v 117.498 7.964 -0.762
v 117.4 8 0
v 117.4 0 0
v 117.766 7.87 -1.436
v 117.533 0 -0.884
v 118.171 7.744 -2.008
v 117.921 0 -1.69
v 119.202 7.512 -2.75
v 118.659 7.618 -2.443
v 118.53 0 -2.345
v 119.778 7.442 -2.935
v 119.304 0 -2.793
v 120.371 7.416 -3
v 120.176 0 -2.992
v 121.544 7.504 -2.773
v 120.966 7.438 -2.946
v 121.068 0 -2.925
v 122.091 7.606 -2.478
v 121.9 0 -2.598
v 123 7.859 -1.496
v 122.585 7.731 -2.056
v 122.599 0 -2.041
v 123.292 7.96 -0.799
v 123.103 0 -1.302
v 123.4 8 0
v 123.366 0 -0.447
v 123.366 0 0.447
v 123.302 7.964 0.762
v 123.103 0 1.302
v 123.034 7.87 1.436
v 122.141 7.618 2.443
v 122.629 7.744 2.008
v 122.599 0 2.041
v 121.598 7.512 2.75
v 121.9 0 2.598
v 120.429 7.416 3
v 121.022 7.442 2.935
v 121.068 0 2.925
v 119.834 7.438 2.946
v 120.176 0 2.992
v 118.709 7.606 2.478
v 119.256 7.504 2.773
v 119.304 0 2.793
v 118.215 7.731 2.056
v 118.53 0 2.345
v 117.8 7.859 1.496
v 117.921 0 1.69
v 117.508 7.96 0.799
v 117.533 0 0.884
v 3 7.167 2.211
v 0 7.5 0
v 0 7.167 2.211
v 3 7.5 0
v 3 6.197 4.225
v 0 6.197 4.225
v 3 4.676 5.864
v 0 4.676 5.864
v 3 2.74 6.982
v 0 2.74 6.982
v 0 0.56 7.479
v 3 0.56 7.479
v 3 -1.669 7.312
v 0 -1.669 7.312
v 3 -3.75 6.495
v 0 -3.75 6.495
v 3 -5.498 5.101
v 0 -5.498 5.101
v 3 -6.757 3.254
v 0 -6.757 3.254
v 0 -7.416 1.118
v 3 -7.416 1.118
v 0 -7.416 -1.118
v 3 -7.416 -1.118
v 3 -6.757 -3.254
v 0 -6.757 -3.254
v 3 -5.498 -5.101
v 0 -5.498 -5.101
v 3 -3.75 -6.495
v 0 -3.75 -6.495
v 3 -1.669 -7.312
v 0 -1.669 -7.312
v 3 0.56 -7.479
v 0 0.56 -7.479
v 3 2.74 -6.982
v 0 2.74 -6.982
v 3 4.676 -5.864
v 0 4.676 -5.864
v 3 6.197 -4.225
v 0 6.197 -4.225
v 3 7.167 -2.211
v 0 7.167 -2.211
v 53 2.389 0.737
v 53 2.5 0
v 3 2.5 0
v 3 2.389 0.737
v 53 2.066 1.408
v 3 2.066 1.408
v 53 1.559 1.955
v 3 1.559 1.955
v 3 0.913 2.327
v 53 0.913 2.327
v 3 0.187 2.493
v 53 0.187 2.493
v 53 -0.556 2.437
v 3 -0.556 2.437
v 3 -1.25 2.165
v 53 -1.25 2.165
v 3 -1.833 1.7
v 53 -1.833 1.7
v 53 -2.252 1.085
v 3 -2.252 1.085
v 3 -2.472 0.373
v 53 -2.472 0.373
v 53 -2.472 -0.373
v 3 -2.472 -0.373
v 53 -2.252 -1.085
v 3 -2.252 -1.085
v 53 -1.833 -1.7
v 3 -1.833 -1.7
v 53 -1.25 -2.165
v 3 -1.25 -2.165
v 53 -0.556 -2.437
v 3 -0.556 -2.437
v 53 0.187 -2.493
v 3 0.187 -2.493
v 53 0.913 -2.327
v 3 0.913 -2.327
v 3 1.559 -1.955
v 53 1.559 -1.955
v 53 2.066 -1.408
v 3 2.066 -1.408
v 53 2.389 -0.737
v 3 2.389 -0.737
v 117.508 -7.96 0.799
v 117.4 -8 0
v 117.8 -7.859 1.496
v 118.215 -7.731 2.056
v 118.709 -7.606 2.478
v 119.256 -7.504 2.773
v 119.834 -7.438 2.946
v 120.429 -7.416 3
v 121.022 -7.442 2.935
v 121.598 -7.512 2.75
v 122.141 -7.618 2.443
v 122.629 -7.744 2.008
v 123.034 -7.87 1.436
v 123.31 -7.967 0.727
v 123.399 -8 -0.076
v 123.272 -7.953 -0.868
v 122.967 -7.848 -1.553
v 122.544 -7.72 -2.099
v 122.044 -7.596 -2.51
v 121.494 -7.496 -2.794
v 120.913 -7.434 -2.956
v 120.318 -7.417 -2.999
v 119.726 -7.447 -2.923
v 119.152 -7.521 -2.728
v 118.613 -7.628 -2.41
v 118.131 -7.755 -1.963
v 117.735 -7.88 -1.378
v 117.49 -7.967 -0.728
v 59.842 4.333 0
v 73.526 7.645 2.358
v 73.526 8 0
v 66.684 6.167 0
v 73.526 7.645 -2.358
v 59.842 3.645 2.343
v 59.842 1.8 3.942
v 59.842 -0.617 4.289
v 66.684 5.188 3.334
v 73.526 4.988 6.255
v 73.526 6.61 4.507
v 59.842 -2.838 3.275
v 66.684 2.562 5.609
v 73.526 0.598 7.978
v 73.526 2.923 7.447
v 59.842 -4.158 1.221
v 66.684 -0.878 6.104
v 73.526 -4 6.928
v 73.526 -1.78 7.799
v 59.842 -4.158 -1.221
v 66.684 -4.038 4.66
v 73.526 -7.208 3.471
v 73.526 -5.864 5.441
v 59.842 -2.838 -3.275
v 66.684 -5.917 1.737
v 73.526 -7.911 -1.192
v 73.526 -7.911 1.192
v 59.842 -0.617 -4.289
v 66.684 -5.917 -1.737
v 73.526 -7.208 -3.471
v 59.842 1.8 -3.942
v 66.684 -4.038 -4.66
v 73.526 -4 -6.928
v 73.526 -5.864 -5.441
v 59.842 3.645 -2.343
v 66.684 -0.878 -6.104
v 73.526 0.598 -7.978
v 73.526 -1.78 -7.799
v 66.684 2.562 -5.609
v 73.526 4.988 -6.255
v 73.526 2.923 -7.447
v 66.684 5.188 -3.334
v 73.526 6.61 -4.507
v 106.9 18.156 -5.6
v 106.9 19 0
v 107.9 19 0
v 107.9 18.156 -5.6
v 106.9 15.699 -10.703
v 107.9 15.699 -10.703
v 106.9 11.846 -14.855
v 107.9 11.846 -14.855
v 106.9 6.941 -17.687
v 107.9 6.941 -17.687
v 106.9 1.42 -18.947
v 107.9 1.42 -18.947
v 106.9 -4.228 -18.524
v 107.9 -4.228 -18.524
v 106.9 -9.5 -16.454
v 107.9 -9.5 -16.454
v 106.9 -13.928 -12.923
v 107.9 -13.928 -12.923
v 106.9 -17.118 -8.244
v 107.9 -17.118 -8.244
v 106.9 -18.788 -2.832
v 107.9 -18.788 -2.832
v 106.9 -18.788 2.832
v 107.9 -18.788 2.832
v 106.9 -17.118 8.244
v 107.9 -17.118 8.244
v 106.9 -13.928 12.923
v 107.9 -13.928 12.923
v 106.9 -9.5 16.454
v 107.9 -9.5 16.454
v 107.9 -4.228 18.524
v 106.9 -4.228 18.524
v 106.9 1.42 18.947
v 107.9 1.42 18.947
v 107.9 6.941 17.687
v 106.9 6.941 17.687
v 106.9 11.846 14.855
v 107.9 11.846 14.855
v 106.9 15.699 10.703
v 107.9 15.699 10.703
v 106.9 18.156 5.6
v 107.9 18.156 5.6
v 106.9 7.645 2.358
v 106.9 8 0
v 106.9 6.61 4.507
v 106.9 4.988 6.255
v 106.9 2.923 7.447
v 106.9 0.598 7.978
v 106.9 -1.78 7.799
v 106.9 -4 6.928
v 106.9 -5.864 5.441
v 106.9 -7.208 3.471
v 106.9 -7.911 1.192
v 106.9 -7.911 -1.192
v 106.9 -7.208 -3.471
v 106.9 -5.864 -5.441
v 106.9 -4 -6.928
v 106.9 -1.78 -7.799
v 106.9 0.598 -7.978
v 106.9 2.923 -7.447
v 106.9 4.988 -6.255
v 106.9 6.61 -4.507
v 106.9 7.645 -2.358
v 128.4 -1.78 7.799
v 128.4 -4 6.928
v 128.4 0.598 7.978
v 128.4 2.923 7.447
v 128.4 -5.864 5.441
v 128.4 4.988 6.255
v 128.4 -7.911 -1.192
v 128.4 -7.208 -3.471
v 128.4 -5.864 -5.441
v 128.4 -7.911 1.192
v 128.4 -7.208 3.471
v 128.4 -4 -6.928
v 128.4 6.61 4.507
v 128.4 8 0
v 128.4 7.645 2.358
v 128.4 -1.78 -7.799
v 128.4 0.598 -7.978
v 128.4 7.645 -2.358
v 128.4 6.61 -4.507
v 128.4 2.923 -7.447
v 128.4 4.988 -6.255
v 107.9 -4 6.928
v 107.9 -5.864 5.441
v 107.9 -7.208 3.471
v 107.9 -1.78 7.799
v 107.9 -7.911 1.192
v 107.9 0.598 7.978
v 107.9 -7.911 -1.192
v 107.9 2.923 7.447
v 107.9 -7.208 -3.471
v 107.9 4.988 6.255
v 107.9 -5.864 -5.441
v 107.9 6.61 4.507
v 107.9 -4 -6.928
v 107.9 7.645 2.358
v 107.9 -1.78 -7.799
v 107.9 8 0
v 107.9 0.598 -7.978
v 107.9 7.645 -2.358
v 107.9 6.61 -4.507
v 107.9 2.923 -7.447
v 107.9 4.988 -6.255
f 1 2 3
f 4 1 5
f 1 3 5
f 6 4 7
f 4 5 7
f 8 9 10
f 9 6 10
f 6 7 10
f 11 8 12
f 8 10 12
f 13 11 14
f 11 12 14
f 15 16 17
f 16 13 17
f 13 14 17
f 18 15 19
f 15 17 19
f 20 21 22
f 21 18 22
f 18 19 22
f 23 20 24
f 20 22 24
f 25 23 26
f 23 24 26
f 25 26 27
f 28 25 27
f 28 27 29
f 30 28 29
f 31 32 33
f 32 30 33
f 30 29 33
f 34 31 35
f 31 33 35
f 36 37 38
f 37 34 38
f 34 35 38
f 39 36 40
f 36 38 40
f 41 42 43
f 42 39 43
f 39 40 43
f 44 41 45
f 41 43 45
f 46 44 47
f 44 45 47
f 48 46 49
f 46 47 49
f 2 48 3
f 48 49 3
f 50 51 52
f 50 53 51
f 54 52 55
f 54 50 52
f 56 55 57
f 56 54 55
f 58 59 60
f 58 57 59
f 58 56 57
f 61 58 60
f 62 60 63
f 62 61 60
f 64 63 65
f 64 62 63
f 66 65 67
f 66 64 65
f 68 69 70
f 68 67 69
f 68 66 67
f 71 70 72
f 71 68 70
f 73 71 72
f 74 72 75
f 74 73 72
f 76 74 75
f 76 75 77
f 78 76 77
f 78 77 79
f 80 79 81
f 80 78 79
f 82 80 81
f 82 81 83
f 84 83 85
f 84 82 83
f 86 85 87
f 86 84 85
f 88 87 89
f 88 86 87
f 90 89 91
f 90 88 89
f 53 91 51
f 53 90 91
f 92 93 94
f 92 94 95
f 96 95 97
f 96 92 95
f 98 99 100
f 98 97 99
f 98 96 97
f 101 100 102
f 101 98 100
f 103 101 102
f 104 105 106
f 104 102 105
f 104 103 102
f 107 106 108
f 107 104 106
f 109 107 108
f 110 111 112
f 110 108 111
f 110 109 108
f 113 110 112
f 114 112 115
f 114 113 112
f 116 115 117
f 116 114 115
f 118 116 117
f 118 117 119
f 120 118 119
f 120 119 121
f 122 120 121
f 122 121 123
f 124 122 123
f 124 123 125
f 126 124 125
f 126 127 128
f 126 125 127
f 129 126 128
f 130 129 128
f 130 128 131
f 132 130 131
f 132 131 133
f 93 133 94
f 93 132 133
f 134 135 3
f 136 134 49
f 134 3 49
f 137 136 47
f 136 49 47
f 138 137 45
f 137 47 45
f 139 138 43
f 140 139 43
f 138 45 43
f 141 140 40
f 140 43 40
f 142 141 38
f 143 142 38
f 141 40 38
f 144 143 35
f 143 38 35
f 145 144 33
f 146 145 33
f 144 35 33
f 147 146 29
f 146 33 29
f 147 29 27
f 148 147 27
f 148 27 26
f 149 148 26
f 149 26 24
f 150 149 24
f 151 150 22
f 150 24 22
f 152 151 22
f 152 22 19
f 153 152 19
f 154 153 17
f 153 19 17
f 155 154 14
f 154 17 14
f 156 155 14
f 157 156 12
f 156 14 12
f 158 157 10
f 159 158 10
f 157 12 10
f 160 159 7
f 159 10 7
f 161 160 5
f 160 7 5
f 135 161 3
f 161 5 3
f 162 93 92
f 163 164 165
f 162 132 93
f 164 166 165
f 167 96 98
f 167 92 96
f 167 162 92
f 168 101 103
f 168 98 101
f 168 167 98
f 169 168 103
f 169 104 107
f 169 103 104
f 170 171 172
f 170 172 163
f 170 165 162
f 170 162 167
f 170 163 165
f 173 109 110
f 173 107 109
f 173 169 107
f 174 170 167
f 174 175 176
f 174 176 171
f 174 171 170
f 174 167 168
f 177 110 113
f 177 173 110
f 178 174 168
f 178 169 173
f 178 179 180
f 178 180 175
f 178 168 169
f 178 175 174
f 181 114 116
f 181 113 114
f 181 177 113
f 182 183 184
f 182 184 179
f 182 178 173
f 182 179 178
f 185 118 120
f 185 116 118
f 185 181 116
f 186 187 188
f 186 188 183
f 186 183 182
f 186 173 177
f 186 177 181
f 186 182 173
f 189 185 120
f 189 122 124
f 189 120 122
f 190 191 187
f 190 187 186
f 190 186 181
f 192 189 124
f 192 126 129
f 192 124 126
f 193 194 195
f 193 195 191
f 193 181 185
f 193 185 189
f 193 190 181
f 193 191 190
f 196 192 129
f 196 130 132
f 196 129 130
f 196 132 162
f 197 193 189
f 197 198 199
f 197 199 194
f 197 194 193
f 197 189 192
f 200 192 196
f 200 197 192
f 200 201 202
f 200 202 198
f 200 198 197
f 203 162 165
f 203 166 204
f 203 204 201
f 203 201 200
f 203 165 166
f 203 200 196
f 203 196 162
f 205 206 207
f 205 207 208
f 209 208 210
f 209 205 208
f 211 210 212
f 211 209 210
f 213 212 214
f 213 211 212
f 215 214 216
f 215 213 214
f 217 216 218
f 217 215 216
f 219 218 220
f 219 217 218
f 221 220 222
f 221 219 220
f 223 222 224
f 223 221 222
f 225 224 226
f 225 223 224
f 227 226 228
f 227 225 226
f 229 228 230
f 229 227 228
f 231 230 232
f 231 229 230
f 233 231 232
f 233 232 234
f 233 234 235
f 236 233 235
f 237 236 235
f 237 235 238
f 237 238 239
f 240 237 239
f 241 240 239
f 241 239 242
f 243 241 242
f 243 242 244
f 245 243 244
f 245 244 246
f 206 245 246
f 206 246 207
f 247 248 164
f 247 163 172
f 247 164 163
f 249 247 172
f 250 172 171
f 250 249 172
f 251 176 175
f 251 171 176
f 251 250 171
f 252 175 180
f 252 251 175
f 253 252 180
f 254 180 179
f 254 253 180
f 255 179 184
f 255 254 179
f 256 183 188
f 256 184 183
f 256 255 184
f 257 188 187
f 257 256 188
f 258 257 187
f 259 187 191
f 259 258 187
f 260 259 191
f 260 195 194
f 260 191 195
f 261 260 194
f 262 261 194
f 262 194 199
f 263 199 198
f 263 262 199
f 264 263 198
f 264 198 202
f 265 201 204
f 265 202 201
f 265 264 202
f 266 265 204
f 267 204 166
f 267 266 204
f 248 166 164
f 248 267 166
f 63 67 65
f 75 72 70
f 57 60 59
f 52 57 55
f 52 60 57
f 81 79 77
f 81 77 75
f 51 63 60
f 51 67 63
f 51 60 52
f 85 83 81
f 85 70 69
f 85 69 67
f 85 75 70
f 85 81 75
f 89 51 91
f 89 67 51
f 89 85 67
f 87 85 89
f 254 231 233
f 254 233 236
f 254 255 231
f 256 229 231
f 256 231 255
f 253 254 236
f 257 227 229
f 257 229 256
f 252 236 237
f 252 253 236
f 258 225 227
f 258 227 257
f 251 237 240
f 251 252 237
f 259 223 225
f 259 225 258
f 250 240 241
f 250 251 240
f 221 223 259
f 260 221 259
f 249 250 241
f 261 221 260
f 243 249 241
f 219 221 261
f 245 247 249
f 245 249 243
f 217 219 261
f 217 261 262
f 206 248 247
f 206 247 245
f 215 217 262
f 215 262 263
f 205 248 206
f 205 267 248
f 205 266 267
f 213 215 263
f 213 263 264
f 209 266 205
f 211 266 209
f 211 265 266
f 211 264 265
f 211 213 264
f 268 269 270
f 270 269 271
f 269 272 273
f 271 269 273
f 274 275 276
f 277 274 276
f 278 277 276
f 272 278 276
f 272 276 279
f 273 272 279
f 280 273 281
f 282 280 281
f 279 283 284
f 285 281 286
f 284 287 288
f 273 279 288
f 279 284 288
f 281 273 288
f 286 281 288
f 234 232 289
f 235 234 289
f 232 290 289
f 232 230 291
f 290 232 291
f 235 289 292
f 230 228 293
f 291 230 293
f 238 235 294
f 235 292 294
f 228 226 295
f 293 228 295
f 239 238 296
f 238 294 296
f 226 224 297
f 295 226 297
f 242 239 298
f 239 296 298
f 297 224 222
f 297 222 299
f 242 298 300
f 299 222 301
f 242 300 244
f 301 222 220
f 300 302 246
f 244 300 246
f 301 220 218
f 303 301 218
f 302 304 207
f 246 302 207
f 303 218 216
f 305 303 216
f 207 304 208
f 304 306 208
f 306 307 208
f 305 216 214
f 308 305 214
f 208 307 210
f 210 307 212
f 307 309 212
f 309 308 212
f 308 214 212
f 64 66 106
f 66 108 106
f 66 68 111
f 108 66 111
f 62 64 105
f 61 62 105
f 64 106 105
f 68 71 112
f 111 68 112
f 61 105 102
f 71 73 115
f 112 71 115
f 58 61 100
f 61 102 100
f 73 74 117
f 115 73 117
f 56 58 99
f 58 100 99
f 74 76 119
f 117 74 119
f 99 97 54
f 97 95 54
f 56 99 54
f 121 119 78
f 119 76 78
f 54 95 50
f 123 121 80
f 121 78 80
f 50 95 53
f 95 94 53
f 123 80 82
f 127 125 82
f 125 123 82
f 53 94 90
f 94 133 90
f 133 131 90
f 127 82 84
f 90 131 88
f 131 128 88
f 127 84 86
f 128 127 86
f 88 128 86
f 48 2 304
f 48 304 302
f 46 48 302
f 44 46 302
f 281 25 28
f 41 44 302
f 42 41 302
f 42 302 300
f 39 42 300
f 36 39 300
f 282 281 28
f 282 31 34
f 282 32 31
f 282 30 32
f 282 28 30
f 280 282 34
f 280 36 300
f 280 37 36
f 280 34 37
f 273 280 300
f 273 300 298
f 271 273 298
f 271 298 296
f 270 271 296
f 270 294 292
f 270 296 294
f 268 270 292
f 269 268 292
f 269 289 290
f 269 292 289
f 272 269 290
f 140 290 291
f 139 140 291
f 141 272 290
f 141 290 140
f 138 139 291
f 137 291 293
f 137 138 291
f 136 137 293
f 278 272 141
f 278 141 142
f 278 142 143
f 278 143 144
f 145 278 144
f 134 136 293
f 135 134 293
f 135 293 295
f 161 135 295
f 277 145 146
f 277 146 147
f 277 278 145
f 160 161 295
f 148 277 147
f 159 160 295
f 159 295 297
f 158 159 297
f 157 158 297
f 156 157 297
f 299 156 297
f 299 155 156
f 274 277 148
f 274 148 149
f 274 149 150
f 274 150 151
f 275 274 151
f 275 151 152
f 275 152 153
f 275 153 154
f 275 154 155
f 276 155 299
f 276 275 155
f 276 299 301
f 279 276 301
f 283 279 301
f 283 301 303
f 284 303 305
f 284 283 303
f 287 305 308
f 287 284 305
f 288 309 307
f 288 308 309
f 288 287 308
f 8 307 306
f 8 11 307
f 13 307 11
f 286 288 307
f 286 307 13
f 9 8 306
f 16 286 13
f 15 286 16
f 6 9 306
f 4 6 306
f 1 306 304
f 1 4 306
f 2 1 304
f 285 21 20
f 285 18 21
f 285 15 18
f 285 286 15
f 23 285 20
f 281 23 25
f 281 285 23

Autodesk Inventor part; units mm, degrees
ref_plane "YZ Plane" through (0, 0, 0) normal (1, 0, 0) x (0, 1, 0)
ref_plane "XZ Plane" through (0, 0, 0) normal (0, 1, 0) x (-1, 0, 0)
ref_plane "XY Plane" through (0, 0, 0) normal (0, 0, 1) x (1, 0, 0)
sketch "Эскиз1" plane through (0, 0, 0) normal (0, 0, 1) x (1, 0, 0)
  line L0 (0, 0) -> (0, 7.5)
  line L1 (0, 7.5) -> (3, 7.5)
  line L2 (3, 7.5) -> (3, 2.5)
  line L3 (3, 2.5) -> (53, 2.5)
  line L4 (53, 2.5) -> (73.5263, 8)
  line L5 (128.4, 8) -> (128.4, 0)
  line L6 (128.4, 0) -> (0, 0)
  line L7 (107.9, 8) -> (107.9, 19)
  line L8 (107.9, 19) -> (106.9, 19)
  line L9 (106.9, 19) -> (106.9, 8)
  line L10 (73.5263, 8) -> (106.9, 8)
  line L11 (107.9, 8) -> (128.4, 8)
  dimension "d0" = 5
  dimension "d1" = 15
  dimension "d2" = 3
  dimension "d3" = 128.4
  dimension "d4" = 15
  dimension "d6" = 50
  dimension "d12" = 1
  dimension "d13" = 16
  dimension "d14" = 21.5
  dimension "d15" = 38
revolve "Вращение1" add sketch "Эскиз1" angle 360 about axis through (128.4, 0, 0) along (-1, 0, 0)
sketch "Эскиз2" plane through (0, 0, 0) normal (0, 1, 0) x (-1, 0, 0)
  circle A0 centre (-120.4, 0) radius 3
  line L0 (-128.4, 8) -> (-128.4, -8) projected
  point P0 (0, 0)
  point P1 (-128.4, 0)
  dimension "d8" = 6
  dimension "d9" = 8
extrude "Выдавливание1" cut sketch "Эскиз2" along normal through all both and the other way through all
properties part number "JF_0837B_Linear solenoid Pull 15N 12v1A Planger" material "Сталь, нержавеющая, аустенитная"
